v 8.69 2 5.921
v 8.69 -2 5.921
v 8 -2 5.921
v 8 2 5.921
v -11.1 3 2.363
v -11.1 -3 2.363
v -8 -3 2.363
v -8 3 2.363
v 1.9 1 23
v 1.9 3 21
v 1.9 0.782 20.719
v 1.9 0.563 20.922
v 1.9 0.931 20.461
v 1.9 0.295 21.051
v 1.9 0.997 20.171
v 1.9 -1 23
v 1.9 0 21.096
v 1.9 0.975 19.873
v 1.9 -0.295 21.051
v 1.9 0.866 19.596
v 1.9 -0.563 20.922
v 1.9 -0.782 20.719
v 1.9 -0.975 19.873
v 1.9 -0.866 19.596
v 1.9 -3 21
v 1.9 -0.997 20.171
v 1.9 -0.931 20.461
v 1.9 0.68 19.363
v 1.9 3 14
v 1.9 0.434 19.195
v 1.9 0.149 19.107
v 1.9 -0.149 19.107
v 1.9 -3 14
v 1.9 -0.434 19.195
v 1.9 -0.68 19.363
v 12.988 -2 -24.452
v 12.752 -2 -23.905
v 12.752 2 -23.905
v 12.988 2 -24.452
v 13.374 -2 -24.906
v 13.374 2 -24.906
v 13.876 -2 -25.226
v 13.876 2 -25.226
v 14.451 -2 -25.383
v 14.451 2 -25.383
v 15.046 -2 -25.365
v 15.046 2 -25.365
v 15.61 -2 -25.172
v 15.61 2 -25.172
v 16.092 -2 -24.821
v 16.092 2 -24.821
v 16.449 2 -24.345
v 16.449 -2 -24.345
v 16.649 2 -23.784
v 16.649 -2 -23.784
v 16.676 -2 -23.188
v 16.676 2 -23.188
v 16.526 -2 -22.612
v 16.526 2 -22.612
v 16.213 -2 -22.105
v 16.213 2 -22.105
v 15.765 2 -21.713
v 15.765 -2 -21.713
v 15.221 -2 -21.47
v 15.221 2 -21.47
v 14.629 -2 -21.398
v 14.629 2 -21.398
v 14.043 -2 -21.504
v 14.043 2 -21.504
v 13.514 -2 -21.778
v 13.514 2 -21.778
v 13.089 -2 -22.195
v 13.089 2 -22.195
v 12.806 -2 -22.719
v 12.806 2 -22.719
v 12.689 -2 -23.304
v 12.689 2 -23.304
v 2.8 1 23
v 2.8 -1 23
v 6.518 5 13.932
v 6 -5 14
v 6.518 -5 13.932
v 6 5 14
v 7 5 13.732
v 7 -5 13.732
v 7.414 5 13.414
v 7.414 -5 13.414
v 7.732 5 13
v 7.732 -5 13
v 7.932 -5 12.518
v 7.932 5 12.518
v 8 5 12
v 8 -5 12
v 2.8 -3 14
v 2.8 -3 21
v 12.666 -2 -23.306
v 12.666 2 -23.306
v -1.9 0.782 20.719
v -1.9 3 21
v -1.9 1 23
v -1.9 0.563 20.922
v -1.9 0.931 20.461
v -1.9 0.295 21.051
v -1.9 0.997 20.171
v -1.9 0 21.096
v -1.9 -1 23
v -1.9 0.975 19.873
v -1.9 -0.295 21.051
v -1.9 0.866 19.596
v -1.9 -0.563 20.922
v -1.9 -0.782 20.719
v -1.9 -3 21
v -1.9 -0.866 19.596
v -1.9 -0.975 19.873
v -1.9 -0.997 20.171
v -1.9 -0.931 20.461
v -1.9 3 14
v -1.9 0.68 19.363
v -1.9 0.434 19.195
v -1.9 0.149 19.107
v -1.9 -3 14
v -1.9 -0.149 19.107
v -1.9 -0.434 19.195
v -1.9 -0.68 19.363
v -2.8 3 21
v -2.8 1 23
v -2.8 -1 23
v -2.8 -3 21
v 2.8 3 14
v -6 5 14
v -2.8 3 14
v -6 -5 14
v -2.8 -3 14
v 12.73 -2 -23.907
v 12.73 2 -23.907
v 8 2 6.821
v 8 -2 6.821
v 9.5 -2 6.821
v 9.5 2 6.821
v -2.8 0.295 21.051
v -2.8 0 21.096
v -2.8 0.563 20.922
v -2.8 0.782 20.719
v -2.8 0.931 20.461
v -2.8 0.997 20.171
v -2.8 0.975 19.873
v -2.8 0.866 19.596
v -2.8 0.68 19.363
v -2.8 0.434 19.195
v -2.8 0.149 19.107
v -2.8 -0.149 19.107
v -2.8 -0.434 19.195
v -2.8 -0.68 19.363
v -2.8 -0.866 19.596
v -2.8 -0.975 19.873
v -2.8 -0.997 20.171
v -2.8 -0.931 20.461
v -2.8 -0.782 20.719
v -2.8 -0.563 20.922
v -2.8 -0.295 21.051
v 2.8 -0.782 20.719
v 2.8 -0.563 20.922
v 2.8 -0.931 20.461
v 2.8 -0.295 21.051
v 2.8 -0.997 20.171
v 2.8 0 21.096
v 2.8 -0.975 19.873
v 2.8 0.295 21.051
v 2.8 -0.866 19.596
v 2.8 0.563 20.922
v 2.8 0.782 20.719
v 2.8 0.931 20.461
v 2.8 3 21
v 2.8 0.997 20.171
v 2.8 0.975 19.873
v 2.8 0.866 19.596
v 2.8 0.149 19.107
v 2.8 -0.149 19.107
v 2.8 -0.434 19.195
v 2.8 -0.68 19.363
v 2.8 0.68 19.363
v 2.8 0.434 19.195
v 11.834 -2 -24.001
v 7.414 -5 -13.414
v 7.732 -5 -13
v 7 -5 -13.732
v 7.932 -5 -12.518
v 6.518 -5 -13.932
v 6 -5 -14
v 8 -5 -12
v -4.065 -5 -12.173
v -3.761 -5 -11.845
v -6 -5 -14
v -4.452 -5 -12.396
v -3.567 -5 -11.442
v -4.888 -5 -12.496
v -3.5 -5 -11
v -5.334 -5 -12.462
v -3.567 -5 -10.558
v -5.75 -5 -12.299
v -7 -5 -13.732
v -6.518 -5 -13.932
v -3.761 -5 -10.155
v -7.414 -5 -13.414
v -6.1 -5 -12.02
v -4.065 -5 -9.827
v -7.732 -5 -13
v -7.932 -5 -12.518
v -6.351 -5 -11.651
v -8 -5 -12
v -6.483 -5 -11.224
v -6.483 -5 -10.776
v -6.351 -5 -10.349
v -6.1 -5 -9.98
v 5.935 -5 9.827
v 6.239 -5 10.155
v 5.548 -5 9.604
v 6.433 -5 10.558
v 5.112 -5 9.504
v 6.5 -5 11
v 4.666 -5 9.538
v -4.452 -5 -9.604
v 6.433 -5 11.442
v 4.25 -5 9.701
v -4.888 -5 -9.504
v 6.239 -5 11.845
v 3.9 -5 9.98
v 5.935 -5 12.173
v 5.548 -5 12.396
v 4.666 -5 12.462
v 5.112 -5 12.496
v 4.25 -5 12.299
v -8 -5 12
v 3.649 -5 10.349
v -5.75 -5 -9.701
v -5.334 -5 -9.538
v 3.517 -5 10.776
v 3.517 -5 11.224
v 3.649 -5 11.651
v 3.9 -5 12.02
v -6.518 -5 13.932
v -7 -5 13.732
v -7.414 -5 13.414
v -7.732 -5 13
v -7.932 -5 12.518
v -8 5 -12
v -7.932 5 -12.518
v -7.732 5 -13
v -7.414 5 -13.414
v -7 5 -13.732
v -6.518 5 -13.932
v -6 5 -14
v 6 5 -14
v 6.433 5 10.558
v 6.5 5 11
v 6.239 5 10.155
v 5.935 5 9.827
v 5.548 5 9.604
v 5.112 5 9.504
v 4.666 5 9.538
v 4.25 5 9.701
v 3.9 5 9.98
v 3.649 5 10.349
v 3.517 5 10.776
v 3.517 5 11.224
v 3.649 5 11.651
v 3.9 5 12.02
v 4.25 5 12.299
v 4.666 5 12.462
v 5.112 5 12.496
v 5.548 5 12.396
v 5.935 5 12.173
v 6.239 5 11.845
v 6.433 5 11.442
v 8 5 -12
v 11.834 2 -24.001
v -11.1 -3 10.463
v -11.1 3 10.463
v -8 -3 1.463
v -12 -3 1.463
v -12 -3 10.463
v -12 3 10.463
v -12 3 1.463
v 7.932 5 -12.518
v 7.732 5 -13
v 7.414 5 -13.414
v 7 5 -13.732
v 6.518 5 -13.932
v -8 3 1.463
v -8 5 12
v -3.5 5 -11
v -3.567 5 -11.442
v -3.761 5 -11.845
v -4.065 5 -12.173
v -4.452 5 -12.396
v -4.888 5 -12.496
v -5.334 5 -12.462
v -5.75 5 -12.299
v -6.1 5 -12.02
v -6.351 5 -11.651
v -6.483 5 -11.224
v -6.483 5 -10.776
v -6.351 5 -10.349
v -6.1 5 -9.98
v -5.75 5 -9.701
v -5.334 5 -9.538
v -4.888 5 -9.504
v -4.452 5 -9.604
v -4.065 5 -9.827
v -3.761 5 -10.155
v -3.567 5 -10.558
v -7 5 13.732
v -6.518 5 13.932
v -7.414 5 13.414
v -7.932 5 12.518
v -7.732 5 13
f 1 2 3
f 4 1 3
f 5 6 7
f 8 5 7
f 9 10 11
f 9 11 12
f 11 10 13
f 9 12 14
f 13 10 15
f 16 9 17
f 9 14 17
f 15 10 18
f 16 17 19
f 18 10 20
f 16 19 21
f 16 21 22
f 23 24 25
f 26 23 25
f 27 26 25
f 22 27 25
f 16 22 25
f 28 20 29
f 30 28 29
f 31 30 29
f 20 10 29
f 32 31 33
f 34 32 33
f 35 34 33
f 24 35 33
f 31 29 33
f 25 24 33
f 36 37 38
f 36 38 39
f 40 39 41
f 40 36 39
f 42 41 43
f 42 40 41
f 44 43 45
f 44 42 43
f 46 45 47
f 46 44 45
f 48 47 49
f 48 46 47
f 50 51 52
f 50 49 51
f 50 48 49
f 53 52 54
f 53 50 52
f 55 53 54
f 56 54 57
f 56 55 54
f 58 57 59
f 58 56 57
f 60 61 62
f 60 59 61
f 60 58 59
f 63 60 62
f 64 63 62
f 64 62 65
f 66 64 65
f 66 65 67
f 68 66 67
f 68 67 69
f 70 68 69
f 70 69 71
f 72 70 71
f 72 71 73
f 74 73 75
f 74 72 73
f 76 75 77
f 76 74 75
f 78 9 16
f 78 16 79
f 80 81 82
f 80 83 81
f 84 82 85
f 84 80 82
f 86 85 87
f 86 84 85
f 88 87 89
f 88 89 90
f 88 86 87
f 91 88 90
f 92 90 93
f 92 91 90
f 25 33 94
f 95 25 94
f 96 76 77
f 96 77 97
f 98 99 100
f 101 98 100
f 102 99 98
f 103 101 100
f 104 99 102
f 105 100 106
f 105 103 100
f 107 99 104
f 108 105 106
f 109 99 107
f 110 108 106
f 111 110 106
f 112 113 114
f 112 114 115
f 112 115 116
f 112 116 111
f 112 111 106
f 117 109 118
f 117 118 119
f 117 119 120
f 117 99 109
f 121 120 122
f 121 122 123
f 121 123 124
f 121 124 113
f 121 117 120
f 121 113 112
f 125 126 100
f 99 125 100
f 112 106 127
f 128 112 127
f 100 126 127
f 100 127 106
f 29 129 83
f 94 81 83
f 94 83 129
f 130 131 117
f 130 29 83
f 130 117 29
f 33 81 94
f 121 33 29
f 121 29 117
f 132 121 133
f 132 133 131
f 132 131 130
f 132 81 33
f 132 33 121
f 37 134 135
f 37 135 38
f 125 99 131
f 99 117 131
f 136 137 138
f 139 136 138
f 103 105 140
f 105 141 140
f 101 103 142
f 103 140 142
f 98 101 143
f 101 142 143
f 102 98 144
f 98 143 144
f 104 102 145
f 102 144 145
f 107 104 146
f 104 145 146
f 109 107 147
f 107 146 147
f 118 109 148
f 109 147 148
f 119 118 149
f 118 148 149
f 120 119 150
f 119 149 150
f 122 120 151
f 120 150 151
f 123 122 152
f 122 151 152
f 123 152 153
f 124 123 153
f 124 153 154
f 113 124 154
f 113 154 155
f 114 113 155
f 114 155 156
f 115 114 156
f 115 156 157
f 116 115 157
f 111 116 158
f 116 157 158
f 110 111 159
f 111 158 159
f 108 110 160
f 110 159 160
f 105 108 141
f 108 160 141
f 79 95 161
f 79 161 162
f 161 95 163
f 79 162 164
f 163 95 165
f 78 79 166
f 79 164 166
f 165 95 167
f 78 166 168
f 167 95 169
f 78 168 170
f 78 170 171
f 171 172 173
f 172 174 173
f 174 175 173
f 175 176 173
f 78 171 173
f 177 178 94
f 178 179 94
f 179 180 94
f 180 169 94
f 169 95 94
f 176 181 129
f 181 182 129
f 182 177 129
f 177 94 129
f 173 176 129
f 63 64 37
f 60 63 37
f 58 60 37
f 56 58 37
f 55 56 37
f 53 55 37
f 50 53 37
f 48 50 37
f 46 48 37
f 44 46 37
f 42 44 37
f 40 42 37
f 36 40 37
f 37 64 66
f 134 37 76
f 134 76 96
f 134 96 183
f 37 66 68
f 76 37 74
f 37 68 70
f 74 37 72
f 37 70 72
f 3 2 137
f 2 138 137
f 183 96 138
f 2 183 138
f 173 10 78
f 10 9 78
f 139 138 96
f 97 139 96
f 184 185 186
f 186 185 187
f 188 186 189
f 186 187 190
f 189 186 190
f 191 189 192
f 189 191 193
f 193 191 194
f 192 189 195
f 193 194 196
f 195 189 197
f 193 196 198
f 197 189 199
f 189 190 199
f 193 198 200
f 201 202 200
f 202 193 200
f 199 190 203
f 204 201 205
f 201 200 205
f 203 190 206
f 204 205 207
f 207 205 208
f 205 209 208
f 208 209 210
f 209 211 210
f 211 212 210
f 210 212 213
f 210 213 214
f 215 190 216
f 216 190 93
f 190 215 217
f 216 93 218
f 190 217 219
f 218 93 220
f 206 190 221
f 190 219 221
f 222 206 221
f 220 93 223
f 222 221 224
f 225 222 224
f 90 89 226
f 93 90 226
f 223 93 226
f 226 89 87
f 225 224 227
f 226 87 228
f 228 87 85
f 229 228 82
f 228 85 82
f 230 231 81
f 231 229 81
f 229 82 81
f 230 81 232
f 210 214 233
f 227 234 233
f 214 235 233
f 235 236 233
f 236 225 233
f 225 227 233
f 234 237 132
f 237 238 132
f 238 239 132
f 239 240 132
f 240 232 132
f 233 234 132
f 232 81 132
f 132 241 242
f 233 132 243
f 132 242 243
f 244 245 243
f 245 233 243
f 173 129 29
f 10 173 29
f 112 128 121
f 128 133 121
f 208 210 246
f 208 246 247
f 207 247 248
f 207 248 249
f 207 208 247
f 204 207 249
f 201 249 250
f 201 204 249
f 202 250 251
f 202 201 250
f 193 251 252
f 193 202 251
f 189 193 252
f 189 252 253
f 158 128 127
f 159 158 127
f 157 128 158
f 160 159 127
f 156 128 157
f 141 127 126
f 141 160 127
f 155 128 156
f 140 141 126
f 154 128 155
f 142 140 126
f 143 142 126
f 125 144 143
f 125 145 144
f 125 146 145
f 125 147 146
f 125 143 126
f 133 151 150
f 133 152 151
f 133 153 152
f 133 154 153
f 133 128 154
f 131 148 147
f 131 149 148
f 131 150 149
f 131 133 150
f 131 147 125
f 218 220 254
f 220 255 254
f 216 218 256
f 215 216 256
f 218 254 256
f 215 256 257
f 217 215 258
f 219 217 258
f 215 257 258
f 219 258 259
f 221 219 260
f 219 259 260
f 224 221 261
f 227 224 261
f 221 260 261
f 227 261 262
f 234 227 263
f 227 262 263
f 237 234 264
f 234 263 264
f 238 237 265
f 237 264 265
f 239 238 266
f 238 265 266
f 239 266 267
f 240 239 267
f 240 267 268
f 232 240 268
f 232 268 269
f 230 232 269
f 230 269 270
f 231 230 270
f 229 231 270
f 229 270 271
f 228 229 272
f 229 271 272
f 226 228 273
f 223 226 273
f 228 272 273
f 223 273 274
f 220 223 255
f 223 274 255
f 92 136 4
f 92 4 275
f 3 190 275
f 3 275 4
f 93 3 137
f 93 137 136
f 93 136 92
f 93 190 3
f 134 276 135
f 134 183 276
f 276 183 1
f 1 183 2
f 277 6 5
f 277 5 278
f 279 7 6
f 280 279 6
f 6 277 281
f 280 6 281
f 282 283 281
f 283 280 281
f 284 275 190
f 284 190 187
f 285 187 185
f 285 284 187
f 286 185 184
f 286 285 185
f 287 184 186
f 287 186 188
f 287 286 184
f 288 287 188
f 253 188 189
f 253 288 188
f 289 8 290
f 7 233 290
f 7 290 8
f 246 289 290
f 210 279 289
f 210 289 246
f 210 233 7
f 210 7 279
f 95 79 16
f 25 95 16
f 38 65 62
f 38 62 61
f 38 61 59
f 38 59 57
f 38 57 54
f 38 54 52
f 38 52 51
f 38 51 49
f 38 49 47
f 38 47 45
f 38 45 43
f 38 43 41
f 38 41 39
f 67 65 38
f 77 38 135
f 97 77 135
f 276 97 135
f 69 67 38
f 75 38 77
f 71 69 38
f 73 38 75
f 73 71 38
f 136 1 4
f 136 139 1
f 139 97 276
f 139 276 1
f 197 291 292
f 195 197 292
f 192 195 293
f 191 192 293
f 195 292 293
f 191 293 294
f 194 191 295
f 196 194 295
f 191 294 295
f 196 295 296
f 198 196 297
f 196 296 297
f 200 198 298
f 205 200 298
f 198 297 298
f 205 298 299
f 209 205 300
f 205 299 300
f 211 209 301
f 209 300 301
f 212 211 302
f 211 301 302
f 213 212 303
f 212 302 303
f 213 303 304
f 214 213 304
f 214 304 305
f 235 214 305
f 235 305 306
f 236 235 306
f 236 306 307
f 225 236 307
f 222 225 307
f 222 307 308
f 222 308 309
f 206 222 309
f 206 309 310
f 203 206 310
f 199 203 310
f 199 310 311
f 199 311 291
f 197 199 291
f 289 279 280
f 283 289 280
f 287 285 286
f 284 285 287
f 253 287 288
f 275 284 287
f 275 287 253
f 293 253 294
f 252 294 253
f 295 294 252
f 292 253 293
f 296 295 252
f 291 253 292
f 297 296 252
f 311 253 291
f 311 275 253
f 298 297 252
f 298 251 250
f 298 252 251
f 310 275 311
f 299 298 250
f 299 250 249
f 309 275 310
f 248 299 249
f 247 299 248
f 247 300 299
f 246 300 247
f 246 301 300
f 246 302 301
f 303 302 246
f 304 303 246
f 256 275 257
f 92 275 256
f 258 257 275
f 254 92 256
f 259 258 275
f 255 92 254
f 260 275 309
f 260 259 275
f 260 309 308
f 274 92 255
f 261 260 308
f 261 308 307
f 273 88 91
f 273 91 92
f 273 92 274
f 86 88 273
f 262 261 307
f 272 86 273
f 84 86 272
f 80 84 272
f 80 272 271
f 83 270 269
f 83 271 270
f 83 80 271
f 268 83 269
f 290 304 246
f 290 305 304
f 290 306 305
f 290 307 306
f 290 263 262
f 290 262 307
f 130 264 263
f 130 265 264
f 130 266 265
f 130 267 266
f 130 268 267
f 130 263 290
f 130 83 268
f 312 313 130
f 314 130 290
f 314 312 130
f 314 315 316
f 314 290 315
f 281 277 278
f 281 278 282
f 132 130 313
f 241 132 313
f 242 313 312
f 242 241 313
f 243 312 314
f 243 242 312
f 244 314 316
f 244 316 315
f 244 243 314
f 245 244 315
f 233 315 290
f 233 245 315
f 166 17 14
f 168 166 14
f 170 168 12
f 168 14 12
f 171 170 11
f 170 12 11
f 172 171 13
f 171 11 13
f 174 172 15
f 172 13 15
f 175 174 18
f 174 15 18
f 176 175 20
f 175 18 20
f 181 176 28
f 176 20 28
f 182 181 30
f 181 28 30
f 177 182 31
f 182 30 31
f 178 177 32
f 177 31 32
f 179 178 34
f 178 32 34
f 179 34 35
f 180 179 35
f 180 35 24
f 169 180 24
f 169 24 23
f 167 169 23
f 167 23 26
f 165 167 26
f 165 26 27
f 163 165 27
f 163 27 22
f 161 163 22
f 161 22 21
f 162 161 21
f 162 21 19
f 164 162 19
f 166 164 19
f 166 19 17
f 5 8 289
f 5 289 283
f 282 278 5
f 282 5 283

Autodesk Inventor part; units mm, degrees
ref_plane "YZ Plane" through (0, 0, 0) normal (1, 0, 0) x (0, 1, 0)
ref_plane "XZ Plane" through (0, 0, 0) normal (0, 1, 0) x (-1, 0, 0)
ref_plane "XY Plane" through (0, 0, 0) normal (0, 0, 1) x (1, 0, 0)
sketch "Sketch1" plane through (0, 0, 0) normal (0, 1, 0) x (-1, 0, 0)
  line L0 (-8, 14) -> (8, 14)
  line L1 (8, 14) -> (8, -14)
  line L2 (8, -14) -> (-8, -14)
  line L3 (-8, -14) -> (-8, 14)
  line L4 (-8, 14) -> (8, -14) construction
  line L5 (8, 14) -> (-8, -14) construction
  point P0 (0, 0)
  dimension "d0" = 16
  dimension "d1" = 28
extrude "Extrusion1" add sketch "Sketch1" along normal mid plane 10
fillet "Fillet1" radius 2 4 edges at (8, 0, 14) (8, 0, -14) (-8, 0, 14) (-8, 0, -14)
sketch "Sketch2" plane through (0, 5, 0) normal (0, 1, 0) x (1, 0, 0)
  arc A0 (-6, 14) -> (-8, 12) centre (-6, 12) ccw projected
  line L0 (-8, 12) -> (-8, -12) projected
  arc A1 (-8, -12) -> (-6, -14) centre (-6, -12) ccw projected
  line L1 (-6, -14) -> (6, -14) projected
  arc A2 (6, -14) -> (8, -12) centre (6, -12) ccw projected
  line L2 (8, -12) -> (8, 12) projected
  arc A3 (8, 12) -> (6, 14) centre (6, 12) ccw projected
  line L3 (6, 14) -> (-6, 14) projected
  circle A4 centre (-5, 11) radius 1.5
  circle A5 centre (5, -11) radius 1.5
  point P0 (0, 0)
  dimension "d5" = 3
  dimension "d6" = 3
  dimension "d7" = 3
  dimension "d8" = 3
  dimension "d9" = 3
extrude "Extrusion2" cut sketch "Sketch2" against normal blind 10 contours A4 | A5
sketch "Sketch3" plane through (-6, -5, 14) normal (0, 0, 1) x (1, 0, 0)
  line L0 (0, 0) -> (0, 10) projected
  line L1 (12, 0) -> (0, 0) projected
  line L2 (12, 10) -> (12, 0) projected
  line L3 (0, 10) -> (12, 10) projected
  line L4 (3.2, 10) -> (4.1, 10)
  line L5 (4.1, 10) -> (4.1, 0)
  line L6 (4.1, 0) -> (3.2, 0)
  line L7 (3.2, 0) -> (3.2, 10)
  line L8 (8.8, 10) -> (7.9, 10)
  line L9 (7.9, 10) -> (7.9, 0)
  line L10 (7.9, 0) -> (8.8, 0)
  line L11 (8.8, 0) -> (8.8, 10)
  line L12 (1, 2) -> (11, 2)
  line L13 (11, 2) -> (11, 8) construction
  line L14 (11, 8) -> (1, 8)
  line L15 (1, 8) -> (1, 2) construction
  point P0 (6, 5)
  point P1 (8.8, 8)
  point P2 (7.9, 8)
  point P3 (7.9, 2)
  point P4 (8.8, 2)
  point P5 (4.1, 8)
  point P6 (3.2, 8)
  point P7 (3.2, 2)
  point P8 (4.1, 2)
  point P9 (11, 5)
  point P10 (12, 5)
  dimension "d12" = 0.9
  dimension "d14" = 10
  dimension "d15" = 6
extrude "Extrusion3" add sketch "Sketch3" along normal blind 9 contours L7 L14 L5 L12 | L9 L14 L11 L12
sketch "Sketch4" plane through (-2.8, -3, 14) normal (-1, 0, 0) x (0, 0, 1)
  line L0 (0, 0) -> (0, 6) projected
  line L1 (9, 6) -> (9, 0) projected
  circle A0 centre (6.0959, 3) radius 1
  line L2 (0, 0) -> (9, 0) projected
  line L3 (0, 6) -> (9, 6) projected
  point P0 (-14, 3)
  point P1 (9, 3)
  dimension "d18" = 2
extrude "Extrusion4" cut sketch "Sketch4" against normal through all contours A0
chamfer "Chamfer1" distance 2 angle 45 4 edges at (-2.35, 3, 23) (2.35, 3, 23) (2.35, -3, 23) (-2.35, -3, 23)
sketch "Sketch5" plane through (0, 0, 0) normal (0, 1, 0) x (-1, 0, 0)
  circle A0 centre (-5, 11) radius 1.5 projected
  circle A1 centre (5, -11) radius 1.5 projected
  arc A2 (6, -14) -> (8, -12) centre (6, -12) ccw projected
  line L0 (8, -12) -> (8, 12) projected
  arc A3 (8, 12) -> (6, 14) centre (6, 12) ccw projected
  line L1 (6, 14) -> (-6, 14) projected
  arc A4 (-6, 14) -> (-8, 12) centre (-6, 12) ccw projected
  line L2 (-8, 12) -> (-8, -12) projected
  arc A5 (-8, -12) -> (-6, -14) centre (-6, -12) ccw projected
  line L3 (-6, -14) -> (6, -14) projected
  line L4 (-8, 6.8206) -> (-9.5, 6.8206)
  line L5 (-9.5, 6.8206) -> (-12.7296, -23.9071)
  line L6 (-11.8345, -24.0012) -> (-8.6896, 5.9206)
  line L7 (-8.6896, 5.9206) -> (-8, 5.9206)
  line L8 (-11.8345, -24.0012) -> (-12.7296, -23.9071)
  line L9 (-12.7296, -23.9071) -> (-14.7187, -23.6981)
  line L10 (-14.7187, -23.6981) -> (-14.6555, -23.0969)
  line L11 (-14.6555, -23.0969) -> (-12.6664, -23.306)
  circle A6 centre (-14.6871, -23.3975) radius 2
  line L12 (-8, 12) -> (-8, -12) projected
  point P0 (0, 0)
  point P1 (-12.6893, -23.3036)
  point P2 (-12.7525, -23.9047)
  dimension "d24" = 0.9
  dimension "d25" = 4
  dimension "d26" = 2
  dimension "d27" = 6
  dimension "d28" = 1.5
extrude "Extrusion5" add sketch "Sketch5" along normal mid plane 4 contours L7 L6 L8 L5 L4 L2 | L5 A6 L11 | L9 A6 L5 | A6 L9 L10 L11 | L11 L10 L9 A6
sketch "Sketch6" plane through (0, 0, 0) normal (0, 1, 0) x (-1, 0, 0)
  line L0 (8, -12) -> (8, 12) projected
  line L1 (8, 1.4634) -> (12, 1.4634)
  line L2 (12, 1.4634) -> (12, 2.3634)
  line L3 (12, 2.3634) -> (8, 2.3634)
  line L4 (8, 2.3634) -> (8, 1.4634)
  line L5 (12, 2.3634) -> (11.1, 2.3634)
  line L6 (11.1, 2.3634) -> (11.1, 10.4634)
  line L7 (11.1, 10.4634) -> (12, 10.4634)
  line L8 (12, 10.4634) -> (12, 2.3634)
  point P0 (0, 0)
  dimension "d31" = 4
  dimension "d32" = 0.9
  dimension "d33" = 0.9
  dimension "d34" = 9
extrude "Extrusion6" add sketch "Sketch6" along normal mid plane 6
properties part number "FIN_DE_CARRERA" material "Steel, Mild, Welded"
